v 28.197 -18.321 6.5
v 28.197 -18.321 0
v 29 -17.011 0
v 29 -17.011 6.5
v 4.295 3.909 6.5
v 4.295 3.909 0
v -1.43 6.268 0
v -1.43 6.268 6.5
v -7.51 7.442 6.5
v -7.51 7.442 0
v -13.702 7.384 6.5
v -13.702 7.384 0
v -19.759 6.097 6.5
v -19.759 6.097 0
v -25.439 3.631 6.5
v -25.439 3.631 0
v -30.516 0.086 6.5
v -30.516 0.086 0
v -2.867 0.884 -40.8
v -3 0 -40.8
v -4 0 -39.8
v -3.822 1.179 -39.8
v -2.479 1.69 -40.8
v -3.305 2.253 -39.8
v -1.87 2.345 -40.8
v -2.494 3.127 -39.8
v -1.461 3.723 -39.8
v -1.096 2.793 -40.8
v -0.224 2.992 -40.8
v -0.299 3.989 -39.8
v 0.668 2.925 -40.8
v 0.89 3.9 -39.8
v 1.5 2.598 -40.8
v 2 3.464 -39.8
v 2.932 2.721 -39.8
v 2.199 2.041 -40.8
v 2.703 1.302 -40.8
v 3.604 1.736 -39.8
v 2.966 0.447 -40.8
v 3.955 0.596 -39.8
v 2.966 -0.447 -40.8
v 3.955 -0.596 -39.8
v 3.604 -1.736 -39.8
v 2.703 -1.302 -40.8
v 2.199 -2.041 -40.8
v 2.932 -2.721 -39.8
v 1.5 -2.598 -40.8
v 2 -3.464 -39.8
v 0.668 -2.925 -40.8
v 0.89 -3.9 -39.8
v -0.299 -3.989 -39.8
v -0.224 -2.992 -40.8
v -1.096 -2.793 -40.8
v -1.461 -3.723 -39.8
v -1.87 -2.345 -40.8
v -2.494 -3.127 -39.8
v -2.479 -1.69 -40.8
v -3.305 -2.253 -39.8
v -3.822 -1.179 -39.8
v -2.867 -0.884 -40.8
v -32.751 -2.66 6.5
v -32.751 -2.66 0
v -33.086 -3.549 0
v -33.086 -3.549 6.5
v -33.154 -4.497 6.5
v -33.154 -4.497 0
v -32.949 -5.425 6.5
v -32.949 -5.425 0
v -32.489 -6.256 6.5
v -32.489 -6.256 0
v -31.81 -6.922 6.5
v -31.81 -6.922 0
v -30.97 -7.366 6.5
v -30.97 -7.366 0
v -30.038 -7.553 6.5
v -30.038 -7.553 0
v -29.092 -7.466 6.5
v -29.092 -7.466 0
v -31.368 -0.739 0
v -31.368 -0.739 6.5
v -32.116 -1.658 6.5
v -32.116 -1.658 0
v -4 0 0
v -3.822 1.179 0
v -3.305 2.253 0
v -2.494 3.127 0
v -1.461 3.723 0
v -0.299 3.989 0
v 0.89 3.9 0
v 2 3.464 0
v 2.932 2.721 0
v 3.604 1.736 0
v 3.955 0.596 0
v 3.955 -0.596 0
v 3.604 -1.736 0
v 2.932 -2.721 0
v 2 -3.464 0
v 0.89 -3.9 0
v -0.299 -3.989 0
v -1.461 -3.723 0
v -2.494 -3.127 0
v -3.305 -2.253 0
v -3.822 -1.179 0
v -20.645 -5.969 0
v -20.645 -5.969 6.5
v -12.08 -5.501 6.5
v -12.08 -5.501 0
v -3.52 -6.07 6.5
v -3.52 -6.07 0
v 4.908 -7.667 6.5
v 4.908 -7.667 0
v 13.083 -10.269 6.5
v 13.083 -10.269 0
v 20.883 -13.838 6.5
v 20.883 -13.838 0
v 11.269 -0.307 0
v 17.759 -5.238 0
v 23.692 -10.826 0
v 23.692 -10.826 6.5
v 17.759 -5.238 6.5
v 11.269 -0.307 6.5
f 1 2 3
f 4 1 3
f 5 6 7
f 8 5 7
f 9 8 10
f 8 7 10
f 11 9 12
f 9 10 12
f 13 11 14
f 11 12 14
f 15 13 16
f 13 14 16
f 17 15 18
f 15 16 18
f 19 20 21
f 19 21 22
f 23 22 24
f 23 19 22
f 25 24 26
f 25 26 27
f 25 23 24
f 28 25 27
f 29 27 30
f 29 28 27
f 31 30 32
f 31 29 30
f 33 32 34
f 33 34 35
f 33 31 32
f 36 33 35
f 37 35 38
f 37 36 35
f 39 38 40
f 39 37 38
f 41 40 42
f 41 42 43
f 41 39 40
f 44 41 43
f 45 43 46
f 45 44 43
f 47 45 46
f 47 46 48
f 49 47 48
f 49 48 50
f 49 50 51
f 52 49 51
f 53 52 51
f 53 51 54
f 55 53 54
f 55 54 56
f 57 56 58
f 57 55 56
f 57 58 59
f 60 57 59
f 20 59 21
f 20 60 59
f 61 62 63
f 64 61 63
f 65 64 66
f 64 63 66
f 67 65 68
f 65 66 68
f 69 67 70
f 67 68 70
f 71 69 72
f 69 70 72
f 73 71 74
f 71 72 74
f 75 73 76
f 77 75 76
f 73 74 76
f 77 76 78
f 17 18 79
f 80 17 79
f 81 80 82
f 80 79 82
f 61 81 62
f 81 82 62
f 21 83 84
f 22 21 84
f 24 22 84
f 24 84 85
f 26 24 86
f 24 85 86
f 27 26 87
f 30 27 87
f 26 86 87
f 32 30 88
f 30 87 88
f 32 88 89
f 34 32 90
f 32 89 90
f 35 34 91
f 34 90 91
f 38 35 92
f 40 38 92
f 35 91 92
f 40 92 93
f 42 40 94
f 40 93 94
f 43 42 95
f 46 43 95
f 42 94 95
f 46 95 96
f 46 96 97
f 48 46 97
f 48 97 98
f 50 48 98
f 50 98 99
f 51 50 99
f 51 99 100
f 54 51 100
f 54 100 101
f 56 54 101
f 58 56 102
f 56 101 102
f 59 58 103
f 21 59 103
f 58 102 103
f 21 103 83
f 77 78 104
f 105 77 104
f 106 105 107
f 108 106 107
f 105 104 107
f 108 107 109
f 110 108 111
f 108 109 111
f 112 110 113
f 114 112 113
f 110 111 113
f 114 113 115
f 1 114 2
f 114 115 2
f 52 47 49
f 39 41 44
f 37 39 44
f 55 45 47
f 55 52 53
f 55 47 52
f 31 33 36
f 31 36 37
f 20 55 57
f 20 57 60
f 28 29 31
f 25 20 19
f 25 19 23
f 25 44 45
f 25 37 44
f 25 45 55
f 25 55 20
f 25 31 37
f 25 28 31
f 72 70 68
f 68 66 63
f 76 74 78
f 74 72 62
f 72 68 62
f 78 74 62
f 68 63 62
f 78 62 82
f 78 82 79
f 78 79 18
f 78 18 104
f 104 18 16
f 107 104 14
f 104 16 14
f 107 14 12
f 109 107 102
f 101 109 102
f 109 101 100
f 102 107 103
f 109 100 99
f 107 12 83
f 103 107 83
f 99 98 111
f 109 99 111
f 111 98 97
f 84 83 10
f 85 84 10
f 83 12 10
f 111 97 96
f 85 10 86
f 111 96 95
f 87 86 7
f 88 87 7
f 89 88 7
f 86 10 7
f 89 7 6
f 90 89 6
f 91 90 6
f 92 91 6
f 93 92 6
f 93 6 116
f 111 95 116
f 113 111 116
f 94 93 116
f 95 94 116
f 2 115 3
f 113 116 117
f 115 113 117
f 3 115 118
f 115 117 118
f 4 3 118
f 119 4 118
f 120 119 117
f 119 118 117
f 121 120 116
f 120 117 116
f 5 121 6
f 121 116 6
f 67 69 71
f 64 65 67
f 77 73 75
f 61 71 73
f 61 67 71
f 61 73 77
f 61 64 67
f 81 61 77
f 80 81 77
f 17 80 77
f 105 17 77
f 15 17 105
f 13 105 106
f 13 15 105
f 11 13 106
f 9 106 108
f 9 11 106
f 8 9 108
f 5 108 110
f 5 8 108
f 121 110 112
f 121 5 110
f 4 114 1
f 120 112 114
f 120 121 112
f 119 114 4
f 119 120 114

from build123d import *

# Parameters (mm, degrees)
BOSS_EXTRUDE1_DEPTH = 6.5
SKETCH2_R           = 4
BOSS_EXTRUDE2_DEPTH = 40.8
CHAMFER1_SIZE       = 1


with BuildPart() as part:
    # Sketch1 → Boss-Extrude1 (new body)
    with BuildSketch(Plane.XY):
        with BuildLine():
            Line((28.196852764, -18.321256673), (29, -17.010639502))
            ThreePointArc((29, -17.010639502), (17.75919782, -5.237578059), (4.294710806, 3.909454184))
            ThreePointArc((4.294710806, 3.909454184), (-13.701993595, 7.383969683), (-30.515502146, 0.086055087))
            ThreePointArc((-30.515502146, 0.086055087), (-31.755615747, -1.187280745), (-32.750708825, -2.660052163))
            ThreePointArc((-32.750708825, -2.660052163), (-32.488602214, -6.256255028), (-29.091806444, -7.465863814))
            ThreePointArc((-29.091806444, -7.465863814), (0.718290474, -6.741295906), (28.196852764, -18.321256673))
        make_face()
    extrude(amount=BOSS_EXTRUDE1_DEPTH)

    # Sketch2 → Boss-Extrude2 (add)
    with BuildSketch(Plane(origin=(0, 0, 0), x_dir=(-1, 0, 0), z_dir=(0, 0, -1))):
        Circle(SKETCH2_R)
    extrude(amount=BOSS_EXTRUDE2_DEPTH)

    # Chamfer1
    chamfer1_edges = [part.edges().sort_by_distance(p)[0] for p in [
        (4, 0, -40.8),
    ]]
    chamfer(chamfer1_edges, length=CHAMFER1_SIZE)


solid = part.part
